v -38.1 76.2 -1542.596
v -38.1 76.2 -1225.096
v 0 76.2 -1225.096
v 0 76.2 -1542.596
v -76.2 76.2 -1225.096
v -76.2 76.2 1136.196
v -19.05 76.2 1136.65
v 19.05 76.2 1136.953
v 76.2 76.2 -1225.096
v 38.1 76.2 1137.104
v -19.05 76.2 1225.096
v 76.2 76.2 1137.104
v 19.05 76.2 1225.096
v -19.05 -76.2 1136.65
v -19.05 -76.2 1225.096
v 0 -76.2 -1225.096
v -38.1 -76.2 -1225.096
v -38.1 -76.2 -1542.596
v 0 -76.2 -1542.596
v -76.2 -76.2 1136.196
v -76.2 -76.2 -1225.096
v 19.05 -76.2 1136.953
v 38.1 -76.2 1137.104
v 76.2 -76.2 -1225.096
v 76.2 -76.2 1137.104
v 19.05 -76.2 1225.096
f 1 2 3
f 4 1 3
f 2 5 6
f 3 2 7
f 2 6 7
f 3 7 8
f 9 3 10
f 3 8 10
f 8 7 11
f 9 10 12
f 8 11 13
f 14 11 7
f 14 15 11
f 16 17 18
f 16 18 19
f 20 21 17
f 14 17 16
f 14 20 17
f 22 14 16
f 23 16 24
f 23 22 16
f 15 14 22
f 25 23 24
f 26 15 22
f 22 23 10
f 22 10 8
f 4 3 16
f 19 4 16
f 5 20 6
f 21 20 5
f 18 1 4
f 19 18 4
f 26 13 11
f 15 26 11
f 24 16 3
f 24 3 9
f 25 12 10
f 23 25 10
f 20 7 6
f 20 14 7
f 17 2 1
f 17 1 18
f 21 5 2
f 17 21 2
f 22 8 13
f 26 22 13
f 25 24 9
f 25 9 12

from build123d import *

# Parameters (mm, degrees)
F1_DEPTH = 76.2
F2_W     = 38.1
F2_H     = 152.4
F3_DEPTH = 317.5


# Not quite as in the source:
# - a feature names something its author has since deleted; it is built from what else it names


with BuildPart() as f1:
    # F0 (on Front) → F1 (new body, symmetric)
    with BuildSketch(Plane.XZ):
        Polygon((-19.05, 1136.65), (-76.2, 1136.1958463669), (-76.2, -1225.0958463669), (76.2, -1225.0958463669), (76.2, 1137.1041536331), (38.1, 1137.1041536331), (19.05, 1136.9527690887), (19.05, 1136.65), align=None)
        Polygon((19.05, 1136.9527690887), (-19.05, 1136.65), (19.05, 1136.65), align=None)
        Polygon((19.05, 1225.0958463669), (-19.05, 1225.0958463669), (-19.05, 1136.65), (19.05, 1136.9527690887), align=None)
    extrude(amount=F1_DEPTH, both=True)

    # F2 (on face) → F3 (join)
    with BuildSketch(Plane(origin=(0, 0, -1225.0958463669), x_dir=(1, 0, 0), z_dir=(0, 0, -1))):
        with Locations((-19.05, 0)):
            Rectangle(F2_W, F2_H)
    extrude(amount=F3_DEPTH)


solid = f1.part
